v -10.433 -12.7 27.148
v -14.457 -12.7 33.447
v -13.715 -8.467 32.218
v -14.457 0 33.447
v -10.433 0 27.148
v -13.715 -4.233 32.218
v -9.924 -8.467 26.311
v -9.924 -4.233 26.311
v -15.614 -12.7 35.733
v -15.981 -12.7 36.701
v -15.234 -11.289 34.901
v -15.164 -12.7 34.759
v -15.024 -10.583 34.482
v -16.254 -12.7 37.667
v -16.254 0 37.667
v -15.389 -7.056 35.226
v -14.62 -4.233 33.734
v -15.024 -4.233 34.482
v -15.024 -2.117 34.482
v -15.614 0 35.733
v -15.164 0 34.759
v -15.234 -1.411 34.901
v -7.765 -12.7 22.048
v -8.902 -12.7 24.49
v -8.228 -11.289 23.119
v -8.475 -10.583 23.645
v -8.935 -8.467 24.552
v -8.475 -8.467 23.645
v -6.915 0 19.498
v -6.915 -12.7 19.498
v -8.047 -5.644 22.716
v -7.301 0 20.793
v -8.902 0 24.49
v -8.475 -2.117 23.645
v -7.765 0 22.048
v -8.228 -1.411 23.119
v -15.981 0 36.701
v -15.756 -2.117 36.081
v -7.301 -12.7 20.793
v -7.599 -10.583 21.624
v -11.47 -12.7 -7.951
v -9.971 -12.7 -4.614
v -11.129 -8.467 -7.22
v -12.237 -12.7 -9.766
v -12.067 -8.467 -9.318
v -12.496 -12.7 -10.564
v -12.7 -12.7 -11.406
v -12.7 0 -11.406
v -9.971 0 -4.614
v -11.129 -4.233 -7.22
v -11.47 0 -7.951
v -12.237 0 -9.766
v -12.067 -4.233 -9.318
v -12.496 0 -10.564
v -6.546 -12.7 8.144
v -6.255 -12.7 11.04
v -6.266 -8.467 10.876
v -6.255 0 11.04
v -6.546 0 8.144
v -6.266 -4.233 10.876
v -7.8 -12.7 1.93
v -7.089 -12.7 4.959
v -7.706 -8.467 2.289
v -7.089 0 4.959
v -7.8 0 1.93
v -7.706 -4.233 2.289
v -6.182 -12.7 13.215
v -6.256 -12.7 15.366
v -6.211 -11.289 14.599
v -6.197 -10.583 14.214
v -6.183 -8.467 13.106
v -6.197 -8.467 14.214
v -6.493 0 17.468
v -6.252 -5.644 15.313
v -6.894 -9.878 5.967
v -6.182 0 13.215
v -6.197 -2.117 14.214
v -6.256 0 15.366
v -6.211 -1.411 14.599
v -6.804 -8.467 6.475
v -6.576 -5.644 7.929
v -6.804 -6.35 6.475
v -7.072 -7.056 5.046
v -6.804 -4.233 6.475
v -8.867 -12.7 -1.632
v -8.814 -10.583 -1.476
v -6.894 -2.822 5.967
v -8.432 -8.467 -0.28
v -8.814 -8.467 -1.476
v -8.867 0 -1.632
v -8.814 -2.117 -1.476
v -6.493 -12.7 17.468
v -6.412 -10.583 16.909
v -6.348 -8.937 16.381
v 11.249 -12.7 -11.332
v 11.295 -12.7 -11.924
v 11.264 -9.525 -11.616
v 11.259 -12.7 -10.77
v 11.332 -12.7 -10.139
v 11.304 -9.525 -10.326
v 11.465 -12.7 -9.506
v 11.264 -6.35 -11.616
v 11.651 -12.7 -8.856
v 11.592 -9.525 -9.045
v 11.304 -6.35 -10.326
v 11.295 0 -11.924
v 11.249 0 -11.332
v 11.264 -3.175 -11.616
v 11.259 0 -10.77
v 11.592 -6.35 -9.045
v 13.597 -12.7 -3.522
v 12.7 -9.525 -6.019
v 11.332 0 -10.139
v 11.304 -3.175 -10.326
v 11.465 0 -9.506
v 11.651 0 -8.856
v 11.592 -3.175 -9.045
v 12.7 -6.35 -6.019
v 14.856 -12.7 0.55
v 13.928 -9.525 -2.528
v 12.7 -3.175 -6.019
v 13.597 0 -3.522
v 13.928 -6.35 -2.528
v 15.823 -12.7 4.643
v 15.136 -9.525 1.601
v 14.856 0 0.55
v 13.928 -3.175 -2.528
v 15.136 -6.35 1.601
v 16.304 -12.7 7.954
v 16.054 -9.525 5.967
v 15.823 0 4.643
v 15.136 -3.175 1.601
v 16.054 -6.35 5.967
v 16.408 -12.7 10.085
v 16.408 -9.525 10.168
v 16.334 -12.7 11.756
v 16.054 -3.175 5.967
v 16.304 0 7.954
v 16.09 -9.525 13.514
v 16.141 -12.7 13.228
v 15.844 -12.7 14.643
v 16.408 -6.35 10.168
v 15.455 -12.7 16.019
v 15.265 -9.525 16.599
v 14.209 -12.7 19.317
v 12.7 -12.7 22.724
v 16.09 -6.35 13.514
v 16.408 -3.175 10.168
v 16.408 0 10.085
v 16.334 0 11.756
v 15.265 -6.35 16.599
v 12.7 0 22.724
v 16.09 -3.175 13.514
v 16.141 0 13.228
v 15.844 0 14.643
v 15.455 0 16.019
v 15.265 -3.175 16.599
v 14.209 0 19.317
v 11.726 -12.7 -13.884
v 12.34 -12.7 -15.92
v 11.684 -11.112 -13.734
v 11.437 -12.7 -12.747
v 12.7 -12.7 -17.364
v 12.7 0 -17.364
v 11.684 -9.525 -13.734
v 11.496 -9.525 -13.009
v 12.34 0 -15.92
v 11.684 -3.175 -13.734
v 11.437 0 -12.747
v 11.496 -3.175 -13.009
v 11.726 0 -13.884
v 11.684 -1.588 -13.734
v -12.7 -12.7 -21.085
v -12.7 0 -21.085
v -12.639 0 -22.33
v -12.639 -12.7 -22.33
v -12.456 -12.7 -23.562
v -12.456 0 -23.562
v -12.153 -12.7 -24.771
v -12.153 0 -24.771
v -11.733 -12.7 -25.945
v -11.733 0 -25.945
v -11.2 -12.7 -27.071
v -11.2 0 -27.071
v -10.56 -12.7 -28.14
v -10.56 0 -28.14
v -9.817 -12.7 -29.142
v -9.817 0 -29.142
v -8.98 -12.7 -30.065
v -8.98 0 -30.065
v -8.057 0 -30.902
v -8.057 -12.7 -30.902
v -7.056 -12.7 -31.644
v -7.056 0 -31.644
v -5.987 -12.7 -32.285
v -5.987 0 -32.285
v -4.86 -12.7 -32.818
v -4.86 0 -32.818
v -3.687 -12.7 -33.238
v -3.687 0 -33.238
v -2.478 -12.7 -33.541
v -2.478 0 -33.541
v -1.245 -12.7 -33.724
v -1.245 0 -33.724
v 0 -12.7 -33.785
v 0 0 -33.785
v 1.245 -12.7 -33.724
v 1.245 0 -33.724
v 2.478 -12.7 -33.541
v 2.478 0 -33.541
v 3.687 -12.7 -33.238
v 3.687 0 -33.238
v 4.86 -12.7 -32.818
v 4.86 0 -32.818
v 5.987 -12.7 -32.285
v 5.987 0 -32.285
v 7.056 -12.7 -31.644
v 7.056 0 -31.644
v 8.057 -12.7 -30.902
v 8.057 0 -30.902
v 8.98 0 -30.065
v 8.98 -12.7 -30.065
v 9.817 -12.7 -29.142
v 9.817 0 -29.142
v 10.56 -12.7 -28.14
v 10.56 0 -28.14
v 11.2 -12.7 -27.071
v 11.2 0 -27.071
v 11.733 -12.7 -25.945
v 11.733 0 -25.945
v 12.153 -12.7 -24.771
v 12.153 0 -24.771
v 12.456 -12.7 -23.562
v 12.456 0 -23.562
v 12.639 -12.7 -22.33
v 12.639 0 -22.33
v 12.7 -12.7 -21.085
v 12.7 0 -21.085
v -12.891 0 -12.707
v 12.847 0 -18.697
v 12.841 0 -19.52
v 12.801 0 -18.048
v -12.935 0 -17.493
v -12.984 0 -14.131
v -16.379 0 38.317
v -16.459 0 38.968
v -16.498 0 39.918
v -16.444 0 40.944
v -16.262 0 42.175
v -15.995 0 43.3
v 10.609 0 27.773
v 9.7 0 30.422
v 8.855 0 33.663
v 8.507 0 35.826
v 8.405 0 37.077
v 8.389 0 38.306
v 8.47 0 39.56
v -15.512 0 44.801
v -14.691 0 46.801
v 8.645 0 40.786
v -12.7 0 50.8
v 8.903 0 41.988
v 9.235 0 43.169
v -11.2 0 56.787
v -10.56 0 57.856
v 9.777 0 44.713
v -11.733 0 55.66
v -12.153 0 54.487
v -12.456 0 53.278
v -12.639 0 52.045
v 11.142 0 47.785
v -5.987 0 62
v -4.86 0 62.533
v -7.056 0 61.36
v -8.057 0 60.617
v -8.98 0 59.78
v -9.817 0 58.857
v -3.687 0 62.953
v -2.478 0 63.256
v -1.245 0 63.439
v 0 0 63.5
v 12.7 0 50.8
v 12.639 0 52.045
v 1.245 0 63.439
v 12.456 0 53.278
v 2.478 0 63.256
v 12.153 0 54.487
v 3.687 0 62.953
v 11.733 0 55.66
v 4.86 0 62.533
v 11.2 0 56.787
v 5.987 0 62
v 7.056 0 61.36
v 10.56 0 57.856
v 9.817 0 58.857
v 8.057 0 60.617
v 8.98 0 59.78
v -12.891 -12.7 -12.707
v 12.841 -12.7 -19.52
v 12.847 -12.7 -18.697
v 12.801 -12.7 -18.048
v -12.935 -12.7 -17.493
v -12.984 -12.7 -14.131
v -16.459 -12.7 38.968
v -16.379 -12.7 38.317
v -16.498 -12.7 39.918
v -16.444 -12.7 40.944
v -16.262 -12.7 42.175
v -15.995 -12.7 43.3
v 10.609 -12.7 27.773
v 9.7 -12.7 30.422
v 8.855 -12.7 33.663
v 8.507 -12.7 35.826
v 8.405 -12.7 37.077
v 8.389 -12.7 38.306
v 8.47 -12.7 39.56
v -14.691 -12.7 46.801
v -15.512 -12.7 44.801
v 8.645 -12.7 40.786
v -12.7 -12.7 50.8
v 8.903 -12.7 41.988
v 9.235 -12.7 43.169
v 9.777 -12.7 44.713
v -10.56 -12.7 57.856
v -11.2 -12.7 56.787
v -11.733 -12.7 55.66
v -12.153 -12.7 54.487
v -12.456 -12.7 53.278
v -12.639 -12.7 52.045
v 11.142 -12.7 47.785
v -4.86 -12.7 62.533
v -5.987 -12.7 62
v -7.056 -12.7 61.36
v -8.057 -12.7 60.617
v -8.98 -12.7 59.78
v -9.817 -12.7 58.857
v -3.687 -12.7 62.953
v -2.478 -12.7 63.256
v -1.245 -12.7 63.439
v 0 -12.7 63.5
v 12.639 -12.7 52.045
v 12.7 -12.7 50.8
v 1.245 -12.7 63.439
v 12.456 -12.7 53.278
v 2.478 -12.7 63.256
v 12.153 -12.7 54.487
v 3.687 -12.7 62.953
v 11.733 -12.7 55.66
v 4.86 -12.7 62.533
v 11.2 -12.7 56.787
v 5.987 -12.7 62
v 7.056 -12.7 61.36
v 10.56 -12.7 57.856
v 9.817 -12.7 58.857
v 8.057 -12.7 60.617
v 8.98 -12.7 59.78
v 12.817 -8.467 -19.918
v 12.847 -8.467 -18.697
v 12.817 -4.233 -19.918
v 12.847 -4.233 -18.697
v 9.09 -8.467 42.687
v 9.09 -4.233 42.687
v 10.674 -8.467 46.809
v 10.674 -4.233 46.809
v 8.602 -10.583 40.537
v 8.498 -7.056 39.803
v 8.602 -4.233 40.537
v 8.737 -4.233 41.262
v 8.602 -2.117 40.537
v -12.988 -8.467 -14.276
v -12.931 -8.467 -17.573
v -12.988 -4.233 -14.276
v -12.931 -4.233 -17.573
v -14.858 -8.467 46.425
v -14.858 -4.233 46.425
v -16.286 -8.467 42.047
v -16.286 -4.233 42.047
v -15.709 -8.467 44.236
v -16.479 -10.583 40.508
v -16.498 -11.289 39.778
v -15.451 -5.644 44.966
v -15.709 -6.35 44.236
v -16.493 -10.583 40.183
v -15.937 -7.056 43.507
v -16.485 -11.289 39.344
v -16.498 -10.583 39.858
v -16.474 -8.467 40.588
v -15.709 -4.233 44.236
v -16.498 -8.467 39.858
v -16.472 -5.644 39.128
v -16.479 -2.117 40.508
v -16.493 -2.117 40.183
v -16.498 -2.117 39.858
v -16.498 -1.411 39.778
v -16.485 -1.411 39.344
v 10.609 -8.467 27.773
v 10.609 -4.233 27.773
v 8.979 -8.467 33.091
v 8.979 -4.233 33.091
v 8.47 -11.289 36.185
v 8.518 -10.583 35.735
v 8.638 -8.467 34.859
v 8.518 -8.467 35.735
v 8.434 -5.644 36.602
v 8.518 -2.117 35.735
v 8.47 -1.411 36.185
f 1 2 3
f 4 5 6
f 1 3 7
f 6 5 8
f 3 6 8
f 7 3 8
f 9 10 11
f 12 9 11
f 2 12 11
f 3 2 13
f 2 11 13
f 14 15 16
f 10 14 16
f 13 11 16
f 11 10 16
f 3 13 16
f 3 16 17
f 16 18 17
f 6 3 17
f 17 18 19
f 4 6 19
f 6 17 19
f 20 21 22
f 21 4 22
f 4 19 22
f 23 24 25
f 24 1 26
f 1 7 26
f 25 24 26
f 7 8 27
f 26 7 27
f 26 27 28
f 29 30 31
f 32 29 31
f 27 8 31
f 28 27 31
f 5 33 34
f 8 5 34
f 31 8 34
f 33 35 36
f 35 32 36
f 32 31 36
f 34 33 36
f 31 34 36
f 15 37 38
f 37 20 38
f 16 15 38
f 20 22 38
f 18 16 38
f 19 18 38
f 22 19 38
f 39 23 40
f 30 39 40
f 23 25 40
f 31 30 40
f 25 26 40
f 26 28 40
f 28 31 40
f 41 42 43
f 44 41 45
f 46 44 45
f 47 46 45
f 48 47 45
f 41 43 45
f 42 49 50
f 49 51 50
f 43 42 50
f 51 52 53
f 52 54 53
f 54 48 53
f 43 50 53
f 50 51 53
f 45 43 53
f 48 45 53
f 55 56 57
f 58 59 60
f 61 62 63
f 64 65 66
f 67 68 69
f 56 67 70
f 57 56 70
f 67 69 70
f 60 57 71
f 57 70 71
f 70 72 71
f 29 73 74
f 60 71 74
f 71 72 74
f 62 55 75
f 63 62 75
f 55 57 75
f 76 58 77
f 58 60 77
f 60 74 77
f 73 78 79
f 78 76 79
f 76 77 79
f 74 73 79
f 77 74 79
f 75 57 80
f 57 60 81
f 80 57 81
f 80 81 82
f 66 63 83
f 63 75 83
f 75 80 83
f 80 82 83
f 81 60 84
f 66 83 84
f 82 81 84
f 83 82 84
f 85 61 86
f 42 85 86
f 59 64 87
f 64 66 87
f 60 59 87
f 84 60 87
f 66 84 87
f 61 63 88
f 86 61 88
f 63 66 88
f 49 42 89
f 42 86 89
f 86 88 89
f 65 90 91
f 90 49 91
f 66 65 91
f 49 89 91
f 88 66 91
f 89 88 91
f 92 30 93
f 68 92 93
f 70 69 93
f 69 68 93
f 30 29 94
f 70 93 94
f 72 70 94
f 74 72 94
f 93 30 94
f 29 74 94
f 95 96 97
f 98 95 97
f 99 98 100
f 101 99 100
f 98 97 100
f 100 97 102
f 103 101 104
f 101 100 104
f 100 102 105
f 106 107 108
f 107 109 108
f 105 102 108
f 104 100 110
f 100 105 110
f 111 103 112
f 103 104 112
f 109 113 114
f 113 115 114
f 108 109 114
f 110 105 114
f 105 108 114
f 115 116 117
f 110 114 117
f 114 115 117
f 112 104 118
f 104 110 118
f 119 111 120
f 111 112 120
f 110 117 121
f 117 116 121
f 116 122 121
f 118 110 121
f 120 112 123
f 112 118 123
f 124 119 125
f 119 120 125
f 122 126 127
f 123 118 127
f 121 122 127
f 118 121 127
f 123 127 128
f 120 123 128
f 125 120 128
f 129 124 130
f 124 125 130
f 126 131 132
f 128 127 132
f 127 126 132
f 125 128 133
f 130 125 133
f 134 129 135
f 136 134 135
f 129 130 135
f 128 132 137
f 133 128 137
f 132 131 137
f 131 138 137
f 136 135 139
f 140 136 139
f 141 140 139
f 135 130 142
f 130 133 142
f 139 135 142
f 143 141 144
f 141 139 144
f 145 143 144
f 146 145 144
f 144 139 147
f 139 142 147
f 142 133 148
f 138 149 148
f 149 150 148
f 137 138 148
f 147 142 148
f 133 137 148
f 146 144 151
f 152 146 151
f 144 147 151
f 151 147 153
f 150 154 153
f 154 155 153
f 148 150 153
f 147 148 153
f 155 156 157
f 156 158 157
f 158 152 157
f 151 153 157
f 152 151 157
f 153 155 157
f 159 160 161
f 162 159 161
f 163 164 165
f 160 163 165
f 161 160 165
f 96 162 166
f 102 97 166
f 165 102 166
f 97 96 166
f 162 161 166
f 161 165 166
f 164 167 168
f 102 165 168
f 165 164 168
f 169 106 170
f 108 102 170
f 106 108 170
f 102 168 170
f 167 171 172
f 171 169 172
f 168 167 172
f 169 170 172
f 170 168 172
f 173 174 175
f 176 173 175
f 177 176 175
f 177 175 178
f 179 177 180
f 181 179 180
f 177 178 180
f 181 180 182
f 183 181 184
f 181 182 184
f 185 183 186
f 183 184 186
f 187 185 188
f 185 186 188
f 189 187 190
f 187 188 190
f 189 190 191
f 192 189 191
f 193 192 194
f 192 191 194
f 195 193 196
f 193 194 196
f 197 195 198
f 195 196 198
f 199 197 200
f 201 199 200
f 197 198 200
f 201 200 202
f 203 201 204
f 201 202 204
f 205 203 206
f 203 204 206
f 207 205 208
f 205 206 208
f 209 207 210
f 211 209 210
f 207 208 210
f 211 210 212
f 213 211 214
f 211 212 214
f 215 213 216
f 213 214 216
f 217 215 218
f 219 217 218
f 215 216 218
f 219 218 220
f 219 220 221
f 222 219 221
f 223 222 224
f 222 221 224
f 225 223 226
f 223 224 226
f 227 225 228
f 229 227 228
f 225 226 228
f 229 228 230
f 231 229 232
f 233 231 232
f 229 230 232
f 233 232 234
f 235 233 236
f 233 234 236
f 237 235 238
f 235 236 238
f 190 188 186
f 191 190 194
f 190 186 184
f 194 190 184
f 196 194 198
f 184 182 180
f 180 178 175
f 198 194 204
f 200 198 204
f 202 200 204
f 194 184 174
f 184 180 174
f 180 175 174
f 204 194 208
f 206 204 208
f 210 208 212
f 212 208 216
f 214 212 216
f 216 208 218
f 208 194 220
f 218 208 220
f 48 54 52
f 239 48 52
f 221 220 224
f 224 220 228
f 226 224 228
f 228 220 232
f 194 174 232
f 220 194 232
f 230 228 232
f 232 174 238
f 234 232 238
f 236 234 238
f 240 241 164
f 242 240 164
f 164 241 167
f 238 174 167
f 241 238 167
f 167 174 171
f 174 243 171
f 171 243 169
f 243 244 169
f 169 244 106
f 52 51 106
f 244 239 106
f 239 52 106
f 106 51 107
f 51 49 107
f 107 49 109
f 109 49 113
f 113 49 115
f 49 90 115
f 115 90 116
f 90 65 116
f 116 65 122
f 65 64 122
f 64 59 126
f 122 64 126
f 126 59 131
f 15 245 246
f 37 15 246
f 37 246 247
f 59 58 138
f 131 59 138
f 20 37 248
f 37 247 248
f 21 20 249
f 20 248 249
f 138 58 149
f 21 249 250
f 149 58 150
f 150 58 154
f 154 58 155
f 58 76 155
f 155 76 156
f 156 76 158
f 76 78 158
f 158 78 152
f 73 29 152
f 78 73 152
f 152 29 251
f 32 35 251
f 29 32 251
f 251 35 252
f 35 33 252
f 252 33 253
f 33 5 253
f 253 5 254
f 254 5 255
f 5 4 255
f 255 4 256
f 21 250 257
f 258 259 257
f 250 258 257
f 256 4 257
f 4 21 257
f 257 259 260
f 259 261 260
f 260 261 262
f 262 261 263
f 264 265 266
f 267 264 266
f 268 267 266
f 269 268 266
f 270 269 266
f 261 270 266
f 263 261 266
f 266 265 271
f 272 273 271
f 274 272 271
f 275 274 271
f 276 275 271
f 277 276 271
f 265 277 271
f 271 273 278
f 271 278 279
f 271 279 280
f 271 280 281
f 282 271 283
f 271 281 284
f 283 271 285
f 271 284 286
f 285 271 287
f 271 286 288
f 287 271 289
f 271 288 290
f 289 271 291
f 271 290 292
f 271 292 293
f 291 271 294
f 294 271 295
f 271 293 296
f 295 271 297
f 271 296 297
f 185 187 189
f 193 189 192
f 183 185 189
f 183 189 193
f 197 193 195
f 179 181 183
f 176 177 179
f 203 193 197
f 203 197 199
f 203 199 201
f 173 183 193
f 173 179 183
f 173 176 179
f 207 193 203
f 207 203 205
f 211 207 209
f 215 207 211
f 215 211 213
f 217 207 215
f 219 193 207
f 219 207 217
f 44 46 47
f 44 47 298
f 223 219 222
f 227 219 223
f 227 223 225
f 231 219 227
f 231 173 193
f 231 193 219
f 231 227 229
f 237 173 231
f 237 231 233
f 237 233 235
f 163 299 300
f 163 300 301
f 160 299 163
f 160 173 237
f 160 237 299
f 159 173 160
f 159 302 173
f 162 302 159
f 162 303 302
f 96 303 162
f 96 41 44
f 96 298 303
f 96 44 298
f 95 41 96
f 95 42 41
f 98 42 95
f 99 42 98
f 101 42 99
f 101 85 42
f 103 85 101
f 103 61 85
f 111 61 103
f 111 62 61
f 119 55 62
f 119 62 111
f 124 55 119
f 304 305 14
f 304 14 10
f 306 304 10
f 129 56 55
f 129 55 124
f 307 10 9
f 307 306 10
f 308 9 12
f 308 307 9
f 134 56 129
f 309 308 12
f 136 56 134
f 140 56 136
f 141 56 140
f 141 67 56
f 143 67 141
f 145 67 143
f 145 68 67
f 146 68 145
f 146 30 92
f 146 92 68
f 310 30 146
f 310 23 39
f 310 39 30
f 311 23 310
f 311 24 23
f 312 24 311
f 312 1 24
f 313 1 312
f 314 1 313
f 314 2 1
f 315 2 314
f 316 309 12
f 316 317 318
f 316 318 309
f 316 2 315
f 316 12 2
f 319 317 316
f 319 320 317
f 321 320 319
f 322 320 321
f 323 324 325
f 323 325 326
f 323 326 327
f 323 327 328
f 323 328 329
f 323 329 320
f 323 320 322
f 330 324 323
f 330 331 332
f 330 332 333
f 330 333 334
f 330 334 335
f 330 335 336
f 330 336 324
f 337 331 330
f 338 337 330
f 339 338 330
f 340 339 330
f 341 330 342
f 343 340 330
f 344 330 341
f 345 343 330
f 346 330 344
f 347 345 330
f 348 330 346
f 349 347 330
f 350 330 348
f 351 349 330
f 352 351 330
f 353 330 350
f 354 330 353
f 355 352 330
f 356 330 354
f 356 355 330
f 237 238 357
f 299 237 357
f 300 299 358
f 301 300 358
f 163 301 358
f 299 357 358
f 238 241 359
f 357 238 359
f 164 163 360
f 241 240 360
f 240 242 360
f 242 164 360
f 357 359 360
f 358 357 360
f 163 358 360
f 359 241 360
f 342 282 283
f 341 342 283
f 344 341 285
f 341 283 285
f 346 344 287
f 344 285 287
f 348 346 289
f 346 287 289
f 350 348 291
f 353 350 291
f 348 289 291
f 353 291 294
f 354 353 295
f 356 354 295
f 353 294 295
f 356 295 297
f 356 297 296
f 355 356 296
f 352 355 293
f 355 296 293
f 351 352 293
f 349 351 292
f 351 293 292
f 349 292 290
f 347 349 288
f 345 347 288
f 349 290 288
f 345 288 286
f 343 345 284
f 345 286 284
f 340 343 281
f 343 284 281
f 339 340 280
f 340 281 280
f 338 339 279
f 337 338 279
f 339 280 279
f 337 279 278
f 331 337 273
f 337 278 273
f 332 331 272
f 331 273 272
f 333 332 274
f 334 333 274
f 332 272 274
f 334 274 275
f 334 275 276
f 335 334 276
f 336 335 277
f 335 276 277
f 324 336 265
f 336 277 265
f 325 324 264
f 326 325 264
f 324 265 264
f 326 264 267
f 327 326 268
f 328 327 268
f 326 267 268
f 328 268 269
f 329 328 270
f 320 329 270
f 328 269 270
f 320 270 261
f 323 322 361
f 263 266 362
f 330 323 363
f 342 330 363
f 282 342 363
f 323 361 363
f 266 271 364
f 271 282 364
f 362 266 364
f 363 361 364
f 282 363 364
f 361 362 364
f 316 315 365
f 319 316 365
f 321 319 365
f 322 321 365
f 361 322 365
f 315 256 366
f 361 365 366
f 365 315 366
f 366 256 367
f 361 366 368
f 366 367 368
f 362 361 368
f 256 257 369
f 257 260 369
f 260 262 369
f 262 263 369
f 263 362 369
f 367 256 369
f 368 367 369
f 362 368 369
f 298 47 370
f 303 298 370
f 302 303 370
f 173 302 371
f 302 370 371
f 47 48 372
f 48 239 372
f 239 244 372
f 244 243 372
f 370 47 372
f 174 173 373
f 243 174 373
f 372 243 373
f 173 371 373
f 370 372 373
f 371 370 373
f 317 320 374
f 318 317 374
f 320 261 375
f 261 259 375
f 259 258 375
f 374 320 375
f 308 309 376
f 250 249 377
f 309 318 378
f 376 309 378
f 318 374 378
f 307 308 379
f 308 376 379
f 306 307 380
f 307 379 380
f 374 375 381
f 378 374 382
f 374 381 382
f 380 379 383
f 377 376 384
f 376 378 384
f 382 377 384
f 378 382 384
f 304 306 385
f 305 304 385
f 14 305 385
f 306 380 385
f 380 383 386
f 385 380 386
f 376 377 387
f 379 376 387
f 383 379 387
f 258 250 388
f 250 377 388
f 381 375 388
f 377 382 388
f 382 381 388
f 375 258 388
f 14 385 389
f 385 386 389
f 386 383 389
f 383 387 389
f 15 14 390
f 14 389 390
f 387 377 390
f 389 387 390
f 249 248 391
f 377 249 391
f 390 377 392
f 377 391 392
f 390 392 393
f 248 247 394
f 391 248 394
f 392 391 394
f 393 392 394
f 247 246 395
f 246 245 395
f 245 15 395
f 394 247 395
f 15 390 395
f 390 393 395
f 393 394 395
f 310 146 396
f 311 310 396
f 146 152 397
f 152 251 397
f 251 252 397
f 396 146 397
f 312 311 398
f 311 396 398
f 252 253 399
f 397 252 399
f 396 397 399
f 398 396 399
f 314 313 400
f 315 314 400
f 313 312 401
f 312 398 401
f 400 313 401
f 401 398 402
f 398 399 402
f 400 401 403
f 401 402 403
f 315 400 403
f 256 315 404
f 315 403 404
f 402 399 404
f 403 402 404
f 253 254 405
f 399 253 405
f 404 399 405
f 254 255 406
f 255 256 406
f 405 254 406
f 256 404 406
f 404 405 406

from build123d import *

# Parameters (mm, degrees)
F1_DEPTH = 12.7


with BuildPart() as f1:
    # F0 (on Front) → F1 (new body)
    with BuildSketch(Plane.XZ):
        with BuildLine():
            Line((-12.7, 50.7999924695), (12.7, 50.7999924695))
            ThreePointArc((12.7, 50.7999924695), (0, 63.4999924695), (-12.7, 50.7999924695))
        make_face()
        with BuildLine():
            add(Edge.make_bspline(
                [(8.3893518895, 38.3055396378), (8.5016980453, 42.8607866704), (10.6008490226, 46.8303895699), (12.7, 50.7999924695)],
                knots=[0.8356188955, 0.8356188955, 0.8356188955, 0.8356188955, 1, 1, 1, 1], degree=3))
            Line((12.7, 50.7999924695), (-12.7, 50.7999924695))
            add(Edge.make_bspline(
                [(-12.7, 50.7999924695), (-14.9799885812, 46.4248424892), (-17.2599771624, 42.0496925089), (-16.2537936121, 37.6669317484)],
                knots=[0, 0, 0, 0, 0.1945957474, 0.1945957474, 0.1945957474, 0.1945957474], degree=3))
            Line((-16.2537936121, 37.6669317484), (8.3893518895, 38.3055396378))
        make_face()
        with BuildLine():
            add(Edge.make_bspline(
                [(12.7, 22.7240230888), (10.5710456649, 27.5132709031), (8.2651004819, 33.2675759272), (8.3893518895, 38.3055396378)],
                knots=[0.6538184283, 0.6538184283, 0.6538184283, 0.6538184283, 0.8356188955, 0.8356188955, 0.8356188955, 0.8356188955], degree=3))
            Line((8.3893518895, 38.3055396378), (-16.2537936121, 37.6669317484))
            add(Edge.make_bspline(
                [(-16.2537936121, 37.6669317484), (-15.0208566806, 32.2964726486), (-8.8537100143, 26.9145859108), (-6.9146538153, 19.4980632514)],
                knots=[0.1945957474, 0.1945957474, 0.1945957474, 0.1945957474, 0.4330455646, 0.4330455646, 0.4330455646, 0.4330455646], degree=3))
            Line((-6.9146538153, 19.4980632514), (12.7, 22.7240230888))
        make_face()
        with BuildLine():
            add(Edge.make_bspline(
                [(16.4083112031, 10.1680448279), (16.3883538394, 14.8858723271), (14.6158419839, 18.414188029), (12.7, 22.7240230888)],
                knots=[0.4902165313, 0.4902165313, 0.4902165313, 0.4902165313, 0.6538184283, 0.6538184283, 0.6538184283, 0.6538184283], degree=3))
            Line((12.7, 22.7240230888), (-6.9146538153, 19.4980632514))
            add(Edge.make_bspline(
                [(-6.9146538153, 19.4980632514), (-4.7996158768, 11.4084437731), (-7.7149464627, 0.898117222), (-9.9710989743, -4.6138959005)],
                knots=[0.4330455646, 0.4330455646, 0.4330455646, 0.4330455646, 0.6931362263, 0.6931362263, 0.6931362263, 0.6931362263], degree=3))
            Line((-9.9710989743, -4.6138959005), (16.4083112031, 10.1680448279))
        make_face()
        with BuildLine():
            add(Edge.make_bspline(
                [(12.7, -17.3643436283), (12.36662001, -15.5902142731), (10.4497065439, -11.2773407147), (12.9323010606, -5.9917759341), (16.4307877717, 4.8546890646), (16.4083112031, 10.1680448279)],
                knots=[0.0872122808, 0.0872122808, 0.0872122808, 0.0872122808, 0.1972730717, 0.3059632744, 0.4902165313, 0.4902165313, 0.4902165313, 0.4902165313], degree=3))
            Line((16.4083112031, 10.1680448279), (-9.9710989743, -4.6138959005))
            add(Edge.make_bspline(
                [(-9.9710989743, -4.6138959005), (-11.2092431706, -7.6388097847), (-12.2488655239, -9.158402979), (-12.7, -11.4059969783)],
                knots=[0.6931362263, 0.6931362263, 0.6931362263, 0.6931362263, 0.8358702576, 0.8358702576, 0.8358702576, 0.8358702576], degree=3))
            Line((-12.7, -11.4059969783), (12.7, -17.3643436283))
        make_face()
        with BuildLine():
            add(Edge.make_bspline(
                [(12.7, -21.0847407579), (12.8320853189, -19.9274531315), (12.9641706378, -18.7701655051), (12.7, -17.3643436283)],
                knots=[0, 0, 0, 0, 0.0872122808, 0.0872122808, 0.0872122808, 0.0872122808], degree=3))
            Line((12.7, -17.3643436283), (-12.7, -11.4059969783))
            add(Edge.make_bspline(
                [(-12.7, -11.4059969783), (-13.2187591539, -13.9905034242), (-12.959379577, -17.5376220911), (-12.7, -21.0847407579)],
                knots=[0.8358702576, 0.8358702576, 0.8358702576, 0.8358702576, 1, 1, 1, 1], degree=3))
            Line((-12.7, -21.0847407579), (12.7, -21.0847407579))
        make_face()
        with BuildLine():
            ThreePointArc((-12.7, -21.0847407579), (0, -33.7847407579), (12.7, -21.0847407579))
            Line((12.7, -21.0847407579), (-12.7, -21.0847407579))
        make_face()
    extrude(amount=F1_DEPTH)


solid = f1.part
